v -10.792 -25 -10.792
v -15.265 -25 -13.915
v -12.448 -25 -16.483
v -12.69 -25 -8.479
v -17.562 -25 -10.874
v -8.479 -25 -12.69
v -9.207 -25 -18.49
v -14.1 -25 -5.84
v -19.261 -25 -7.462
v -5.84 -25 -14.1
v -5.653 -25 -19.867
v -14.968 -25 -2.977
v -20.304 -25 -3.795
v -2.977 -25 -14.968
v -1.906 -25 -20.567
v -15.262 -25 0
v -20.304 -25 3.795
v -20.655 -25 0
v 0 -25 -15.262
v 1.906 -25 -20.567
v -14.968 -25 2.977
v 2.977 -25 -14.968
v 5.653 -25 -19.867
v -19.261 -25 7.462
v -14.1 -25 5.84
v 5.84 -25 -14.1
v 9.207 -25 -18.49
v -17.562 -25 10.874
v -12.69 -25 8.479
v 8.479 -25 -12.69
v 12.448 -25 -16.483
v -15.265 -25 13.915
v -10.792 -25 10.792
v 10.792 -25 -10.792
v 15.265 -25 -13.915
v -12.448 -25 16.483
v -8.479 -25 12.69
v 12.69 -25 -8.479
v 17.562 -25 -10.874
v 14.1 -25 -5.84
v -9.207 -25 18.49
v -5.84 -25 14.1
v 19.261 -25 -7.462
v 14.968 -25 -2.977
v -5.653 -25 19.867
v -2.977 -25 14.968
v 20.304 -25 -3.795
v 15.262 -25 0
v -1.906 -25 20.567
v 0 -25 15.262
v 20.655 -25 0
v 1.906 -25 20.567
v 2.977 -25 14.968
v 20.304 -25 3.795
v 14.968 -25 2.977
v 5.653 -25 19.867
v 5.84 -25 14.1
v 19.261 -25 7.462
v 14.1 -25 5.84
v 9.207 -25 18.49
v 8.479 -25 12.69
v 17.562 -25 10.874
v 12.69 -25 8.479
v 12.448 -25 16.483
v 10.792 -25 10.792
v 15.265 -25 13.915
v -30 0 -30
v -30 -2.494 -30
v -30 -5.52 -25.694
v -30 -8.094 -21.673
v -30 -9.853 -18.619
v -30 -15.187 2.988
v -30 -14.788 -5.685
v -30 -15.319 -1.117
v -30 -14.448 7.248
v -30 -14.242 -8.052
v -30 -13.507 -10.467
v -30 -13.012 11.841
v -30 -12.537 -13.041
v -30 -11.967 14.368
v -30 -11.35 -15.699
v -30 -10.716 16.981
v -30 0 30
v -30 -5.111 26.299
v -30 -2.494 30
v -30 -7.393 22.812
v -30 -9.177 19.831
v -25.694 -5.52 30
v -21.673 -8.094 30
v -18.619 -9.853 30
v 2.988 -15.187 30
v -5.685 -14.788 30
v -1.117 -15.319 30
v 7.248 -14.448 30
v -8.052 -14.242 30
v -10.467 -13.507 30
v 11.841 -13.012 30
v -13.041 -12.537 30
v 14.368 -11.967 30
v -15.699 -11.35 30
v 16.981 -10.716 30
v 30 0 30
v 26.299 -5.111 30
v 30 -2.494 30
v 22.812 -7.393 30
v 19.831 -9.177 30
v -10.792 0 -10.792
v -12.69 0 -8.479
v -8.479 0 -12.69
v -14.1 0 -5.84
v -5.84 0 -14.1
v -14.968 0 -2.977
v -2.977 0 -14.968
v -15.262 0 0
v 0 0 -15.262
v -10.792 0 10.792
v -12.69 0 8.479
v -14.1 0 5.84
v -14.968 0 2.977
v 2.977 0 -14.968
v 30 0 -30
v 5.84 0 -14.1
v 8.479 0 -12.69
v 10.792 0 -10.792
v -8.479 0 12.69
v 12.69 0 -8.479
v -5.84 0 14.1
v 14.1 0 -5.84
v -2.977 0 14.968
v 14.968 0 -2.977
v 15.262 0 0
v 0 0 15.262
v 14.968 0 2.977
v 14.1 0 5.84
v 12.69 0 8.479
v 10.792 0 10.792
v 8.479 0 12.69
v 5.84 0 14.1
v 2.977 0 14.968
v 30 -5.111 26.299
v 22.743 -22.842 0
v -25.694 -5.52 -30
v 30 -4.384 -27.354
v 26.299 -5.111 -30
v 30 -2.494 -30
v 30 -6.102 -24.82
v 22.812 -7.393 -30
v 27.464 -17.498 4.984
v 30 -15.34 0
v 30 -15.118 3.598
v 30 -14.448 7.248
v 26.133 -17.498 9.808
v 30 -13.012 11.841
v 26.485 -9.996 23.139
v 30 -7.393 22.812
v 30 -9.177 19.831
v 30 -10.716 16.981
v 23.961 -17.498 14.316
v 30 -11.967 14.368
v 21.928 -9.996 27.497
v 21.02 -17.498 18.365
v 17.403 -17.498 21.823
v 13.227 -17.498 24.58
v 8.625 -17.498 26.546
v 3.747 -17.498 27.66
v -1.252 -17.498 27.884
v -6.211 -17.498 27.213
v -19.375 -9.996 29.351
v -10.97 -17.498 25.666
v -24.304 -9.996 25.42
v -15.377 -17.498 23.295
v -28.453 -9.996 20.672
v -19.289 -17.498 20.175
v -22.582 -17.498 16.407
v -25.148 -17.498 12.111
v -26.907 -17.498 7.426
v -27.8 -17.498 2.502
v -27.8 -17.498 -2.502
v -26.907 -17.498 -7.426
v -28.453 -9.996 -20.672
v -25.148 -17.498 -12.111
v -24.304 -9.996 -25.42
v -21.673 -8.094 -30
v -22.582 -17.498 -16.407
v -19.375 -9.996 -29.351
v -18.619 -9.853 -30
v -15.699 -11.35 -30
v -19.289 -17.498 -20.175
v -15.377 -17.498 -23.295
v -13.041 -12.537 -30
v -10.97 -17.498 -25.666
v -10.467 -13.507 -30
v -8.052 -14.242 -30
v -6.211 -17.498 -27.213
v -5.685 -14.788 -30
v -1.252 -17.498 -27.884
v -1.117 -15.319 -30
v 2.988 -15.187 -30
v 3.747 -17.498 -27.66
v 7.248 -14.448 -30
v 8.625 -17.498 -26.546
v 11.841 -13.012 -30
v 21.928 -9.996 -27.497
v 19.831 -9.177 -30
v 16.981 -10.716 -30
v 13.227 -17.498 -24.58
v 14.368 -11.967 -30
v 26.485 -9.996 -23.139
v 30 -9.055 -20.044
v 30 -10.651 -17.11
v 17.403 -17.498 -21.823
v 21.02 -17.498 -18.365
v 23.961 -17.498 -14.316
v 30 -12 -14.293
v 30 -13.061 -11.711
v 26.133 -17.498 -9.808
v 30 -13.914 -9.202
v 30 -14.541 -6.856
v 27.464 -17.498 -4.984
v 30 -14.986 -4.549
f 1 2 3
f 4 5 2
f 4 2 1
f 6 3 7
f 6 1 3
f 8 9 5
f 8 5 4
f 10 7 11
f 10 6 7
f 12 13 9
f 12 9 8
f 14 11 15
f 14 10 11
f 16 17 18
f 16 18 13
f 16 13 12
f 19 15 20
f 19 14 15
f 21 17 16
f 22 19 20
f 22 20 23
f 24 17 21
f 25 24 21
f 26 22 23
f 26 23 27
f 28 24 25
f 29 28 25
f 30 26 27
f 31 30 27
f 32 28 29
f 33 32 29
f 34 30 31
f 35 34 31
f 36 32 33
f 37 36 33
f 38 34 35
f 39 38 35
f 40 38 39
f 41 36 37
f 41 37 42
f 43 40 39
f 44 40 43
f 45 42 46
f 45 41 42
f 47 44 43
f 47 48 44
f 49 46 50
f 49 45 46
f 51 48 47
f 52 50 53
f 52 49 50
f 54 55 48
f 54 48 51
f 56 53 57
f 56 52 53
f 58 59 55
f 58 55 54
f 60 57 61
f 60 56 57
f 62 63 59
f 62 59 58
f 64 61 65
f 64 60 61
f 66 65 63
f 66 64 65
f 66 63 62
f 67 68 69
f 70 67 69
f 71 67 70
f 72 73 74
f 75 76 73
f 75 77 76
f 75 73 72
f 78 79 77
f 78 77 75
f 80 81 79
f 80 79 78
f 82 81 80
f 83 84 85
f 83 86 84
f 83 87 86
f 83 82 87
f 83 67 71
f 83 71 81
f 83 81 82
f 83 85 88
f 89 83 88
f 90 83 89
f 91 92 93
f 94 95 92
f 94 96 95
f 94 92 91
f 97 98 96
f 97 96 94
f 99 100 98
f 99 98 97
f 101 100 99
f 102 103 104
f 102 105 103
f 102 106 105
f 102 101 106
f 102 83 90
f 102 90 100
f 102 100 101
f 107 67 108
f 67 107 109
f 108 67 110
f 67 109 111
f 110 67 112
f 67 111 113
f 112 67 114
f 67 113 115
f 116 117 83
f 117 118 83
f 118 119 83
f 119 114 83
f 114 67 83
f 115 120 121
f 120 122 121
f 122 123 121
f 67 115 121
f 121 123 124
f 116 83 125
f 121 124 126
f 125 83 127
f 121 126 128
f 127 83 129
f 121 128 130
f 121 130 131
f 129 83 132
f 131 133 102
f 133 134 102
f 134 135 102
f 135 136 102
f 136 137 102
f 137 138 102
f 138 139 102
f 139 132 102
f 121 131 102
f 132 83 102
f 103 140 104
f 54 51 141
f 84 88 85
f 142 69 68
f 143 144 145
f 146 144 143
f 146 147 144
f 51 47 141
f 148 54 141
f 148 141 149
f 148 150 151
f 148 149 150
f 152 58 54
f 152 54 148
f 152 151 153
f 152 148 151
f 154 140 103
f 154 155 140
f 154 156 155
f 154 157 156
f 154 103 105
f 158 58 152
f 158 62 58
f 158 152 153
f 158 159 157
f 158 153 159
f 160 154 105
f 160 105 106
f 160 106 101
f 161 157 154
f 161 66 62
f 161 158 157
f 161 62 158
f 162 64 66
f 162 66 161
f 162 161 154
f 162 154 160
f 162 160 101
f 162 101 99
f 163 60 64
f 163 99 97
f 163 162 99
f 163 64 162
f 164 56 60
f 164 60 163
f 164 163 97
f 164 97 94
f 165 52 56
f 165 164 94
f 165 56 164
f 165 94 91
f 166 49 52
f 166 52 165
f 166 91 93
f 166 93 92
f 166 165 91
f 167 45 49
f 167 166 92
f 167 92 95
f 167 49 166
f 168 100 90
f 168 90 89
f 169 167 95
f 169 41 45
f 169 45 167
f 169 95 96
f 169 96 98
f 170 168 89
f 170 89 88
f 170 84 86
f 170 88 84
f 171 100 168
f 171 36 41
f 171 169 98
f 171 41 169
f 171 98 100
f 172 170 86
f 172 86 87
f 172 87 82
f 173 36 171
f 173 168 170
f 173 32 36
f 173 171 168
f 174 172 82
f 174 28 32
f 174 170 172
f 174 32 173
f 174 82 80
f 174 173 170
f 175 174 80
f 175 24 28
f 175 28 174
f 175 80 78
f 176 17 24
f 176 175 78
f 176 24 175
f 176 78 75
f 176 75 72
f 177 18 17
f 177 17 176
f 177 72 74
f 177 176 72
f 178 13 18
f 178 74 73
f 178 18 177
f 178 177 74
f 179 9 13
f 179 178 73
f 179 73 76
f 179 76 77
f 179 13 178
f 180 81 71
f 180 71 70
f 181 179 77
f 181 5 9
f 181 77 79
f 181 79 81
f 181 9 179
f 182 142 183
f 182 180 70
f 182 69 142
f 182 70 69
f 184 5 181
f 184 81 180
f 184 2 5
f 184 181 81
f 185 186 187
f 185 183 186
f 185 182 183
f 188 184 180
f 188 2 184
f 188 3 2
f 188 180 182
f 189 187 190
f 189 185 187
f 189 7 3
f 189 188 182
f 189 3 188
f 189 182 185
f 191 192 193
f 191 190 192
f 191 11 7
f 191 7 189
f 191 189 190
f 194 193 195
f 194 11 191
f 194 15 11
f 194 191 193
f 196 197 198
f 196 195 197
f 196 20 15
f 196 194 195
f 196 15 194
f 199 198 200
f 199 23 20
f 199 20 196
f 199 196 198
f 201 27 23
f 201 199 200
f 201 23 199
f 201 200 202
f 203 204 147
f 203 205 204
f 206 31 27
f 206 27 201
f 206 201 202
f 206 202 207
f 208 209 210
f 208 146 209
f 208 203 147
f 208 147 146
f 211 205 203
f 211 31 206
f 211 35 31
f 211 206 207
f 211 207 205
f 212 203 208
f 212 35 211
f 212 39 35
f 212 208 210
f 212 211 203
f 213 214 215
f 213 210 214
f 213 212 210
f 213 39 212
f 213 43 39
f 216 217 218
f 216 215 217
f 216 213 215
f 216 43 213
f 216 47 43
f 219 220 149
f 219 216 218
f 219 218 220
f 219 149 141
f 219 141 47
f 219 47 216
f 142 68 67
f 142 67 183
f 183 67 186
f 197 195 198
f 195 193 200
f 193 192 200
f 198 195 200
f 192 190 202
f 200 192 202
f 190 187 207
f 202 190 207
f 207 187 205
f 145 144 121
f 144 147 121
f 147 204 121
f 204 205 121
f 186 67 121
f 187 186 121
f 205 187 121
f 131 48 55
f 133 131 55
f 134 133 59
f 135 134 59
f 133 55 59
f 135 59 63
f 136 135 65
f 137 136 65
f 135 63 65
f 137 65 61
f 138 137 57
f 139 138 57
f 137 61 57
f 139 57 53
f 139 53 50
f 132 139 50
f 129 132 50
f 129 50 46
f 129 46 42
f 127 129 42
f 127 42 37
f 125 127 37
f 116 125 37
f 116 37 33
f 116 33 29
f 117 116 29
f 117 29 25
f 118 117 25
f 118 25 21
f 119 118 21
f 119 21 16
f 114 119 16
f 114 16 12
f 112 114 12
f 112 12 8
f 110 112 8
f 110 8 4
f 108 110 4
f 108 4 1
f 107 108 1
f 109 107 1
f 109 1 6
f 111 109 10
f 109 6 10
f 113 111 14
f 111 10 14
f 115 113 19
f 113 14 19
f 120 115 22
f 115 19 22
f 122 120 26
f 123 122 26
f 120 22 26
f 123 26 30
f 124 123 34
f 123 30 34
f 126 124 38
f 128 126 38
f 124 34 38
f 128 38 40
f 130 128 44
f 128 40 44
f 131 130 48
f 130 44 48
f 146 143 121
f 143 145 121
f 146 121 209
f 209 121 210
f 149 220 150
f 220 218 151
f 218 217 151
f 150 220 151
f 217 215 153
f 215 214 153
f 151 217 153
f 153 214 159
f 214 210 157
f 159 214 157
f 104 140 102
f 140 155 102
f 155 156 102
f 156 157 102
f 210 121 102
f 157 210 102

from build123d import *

# Parameters (mm, degrees)
F0_W     = 60
F0_H     = 60
F1_DEPTH = 25
F2_R     = 44.839228
F3_R     = 20.655466
F5_R     = 15.261673
F6_DEPTH = 30


with BuildPart() as f1:
    # F0 (on Front) → F1 (new body)
    with BuildSketch(Plane.XZ):
        Rectangle(F0_W, F0_H)
    extrude(amount=F1_DEPTH)

    # F2 (on Front) → F4 section 0
    with BuildSketch(Plane.XZ):
        Circle(F2_R)
    # F3 (on face) → F4 section 1
    with BuildSketch(Plane.XZ.offset(25)):
        Circle(F3_R)
    loft(mode=Mode.INTERSECT)

    # F5 (on face) → F6 (cut)
    with BuildSketch(Plane.XZ.offset(25)):
        Circle(F5_R)
    extrude(amount=-F6_DEPTH, mode=Mode.SUBTRACT)


solid = f1.part
